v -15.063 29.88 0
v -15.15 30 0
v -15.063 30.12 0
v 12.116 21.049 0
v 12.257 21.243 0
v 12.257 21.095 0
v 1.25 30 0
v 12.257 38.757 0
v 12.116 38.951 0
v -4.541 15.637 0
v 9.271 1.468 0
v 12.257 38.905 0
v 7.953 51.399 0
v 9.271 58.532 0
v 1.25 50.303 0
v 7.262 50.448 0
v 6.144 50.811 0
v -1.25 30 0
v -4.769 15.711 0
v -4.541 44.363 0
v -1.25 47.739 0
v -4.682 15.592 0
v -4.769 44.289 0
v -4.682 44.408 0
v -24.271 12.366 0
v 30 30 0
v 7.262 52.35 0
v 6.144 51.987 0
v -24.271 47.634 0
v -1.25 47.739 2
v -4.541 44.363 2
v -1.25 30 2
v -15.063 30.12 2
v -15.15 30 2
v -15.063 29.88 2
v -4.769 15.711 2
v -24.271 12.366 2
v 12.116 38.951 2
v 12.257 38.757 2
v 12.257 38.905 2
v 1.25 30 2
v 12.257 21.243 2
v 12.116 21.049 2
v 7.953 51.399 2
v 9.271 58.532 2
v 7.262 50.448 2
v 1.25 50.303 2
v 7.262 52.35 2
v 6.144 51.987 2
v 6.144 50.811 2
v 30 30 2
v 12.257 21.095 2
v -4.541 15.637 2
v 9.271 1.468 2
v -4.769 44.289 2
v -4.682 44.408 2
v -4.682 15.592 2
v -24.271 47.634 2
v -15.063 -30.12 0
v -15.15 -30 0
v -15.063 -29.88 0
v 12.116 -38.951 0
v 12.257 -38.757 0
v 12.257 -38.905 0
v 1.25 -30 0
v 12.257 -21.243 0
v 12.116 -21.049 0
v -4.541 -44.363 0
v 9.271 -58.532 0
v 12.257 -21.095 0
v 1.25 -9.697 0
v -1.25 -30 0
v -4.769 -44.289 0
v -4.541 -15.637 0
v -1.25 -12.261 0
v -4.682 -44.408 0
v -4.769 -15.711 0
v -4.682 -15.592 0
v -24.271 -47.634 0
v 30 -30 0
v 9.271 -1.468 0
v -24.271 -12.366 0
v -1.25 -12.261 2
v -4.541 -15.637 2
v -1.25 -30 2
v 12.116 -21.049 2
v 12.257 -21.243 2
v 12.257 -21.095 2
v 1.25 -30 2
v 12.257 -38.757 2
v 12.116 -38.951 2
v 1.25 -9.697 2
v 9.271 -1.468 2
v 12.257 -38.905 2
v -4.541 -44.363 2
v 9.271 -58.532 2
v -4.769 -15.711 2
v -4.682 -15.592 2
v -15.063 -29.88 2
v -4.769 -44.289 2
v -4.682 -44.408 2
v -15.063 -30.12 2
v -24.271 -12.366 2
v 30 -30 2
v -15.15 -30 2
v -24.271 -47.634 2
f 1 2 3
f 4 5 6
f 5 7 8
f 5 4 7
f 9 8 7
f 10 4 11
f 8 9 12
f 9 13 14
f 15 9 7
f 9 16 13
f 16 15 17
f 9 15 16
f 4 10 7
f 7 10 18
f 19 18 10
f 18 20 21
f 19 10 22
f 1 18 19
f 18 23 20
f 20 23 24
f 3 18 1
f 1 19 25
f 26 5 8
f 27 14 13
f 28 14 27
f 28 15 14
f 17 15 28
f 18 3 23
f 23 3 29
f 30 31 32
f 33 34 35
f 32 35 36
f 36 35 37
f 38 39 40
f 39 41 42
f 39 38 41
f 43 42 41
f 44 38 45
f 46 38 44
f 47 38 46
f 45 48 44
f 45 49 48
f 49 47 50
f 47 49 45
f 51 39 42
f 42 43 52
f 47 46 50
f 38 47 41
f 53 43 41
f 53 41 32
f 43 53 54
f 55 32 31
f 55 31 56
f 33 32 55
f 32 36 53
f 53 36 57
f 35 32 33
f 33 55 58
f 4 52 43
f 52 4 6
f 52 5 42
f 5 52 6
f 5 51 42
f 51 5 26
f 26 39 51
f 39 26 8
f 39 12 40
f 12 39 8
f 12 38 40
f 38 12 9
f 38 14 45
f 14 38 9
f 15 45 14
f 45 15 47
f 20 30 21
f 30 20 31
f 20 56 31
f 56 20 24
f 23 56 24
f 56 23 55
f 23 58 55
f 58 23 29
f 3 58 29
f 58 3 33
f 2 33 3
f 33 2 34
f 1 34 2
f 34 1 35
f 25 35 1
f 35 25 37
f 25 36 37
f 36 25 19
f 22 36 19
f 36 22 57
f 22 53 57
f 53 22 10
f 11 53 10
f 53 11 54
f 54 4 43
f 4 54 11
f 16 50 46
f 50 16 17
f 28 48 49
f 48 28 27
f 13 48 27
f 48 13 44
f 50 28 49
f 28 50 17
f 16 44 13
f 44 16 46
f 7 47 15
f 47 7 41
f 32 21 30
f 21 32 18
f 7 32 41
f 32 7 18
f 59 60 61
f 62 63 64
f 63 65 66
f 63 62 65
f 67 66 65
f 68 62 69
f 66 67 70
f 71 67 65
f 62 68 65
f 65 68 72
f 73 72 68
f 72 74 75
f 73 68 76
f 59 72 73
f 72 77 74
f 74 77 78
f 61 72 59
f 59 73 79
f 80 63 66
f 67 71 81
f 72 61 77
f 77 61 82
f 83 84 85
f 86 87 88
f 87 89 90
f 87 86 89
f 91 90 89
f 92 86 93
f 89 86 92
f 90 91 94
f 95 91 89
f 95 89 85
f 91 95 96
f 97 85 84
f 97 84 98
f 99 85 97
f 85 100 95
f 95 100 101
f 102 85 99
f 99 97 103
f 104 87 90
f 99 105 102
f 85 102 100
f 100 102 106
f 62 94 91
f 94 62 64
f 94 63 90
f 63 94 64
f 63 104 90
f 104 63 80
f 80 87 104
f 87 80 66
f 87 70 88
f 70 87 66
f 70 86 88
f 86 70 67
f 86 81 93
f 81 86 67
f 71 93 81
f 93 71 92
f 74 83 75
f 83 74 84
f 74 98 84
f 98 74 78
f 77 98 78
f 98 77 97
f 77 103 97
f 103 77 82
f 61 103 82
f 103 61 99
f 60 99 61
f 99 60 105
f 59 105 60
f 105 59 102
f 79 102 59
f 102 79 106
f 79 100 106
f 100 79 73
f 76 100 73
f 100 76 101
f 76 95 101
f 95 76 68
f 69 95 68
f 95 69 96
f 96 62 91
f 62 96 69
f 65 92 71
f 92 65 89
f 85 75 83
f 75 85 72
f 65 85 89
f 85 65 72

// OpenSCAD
n=6;
h=2;
ro=30;
ri=15;

//-- Parametric star
//-- (c)  2010 Juan Gonzalez-Gomez (Obijuan) juan@iearobotics.com
//-- GPL license

//-- The 2*N points of an N-ponted star are calculated as follows:
//-- There are two circunferences:  the inner and outer.  Outer points are located
//-- at angles: 0, 360/N, 360*2/N and on the outer circunference
//-- The inner points have the same angular distance but they are 360/(2*N) rotated
//-- respect to the outers. They are located on the inner circunference

//--- INPUT PARAMETERS:
//--- N: Number of points
//--  h: Height
//-- ri: Inner radius
//-- ro: outer radius
module parametric_star(N=5, h=3, ri=15, re=30) {

  //-- Calculate and draw a 2D tip of the star
 //-- INPUT: 
 //-- n: Number of the tip (from 0 to N-1)
  module tipstar(n) {
     i1 =  [ri*cos(-360*n/N+360/(N*2)), ri*sin(-360*n/N+360/(N*2))];
    e1 = [re*cos(-360*n/N), re*sin(-360*n/N)];
    i2 = [ri*cos(-360*(n+1)/N+360/(N*2)), ri*sin(-360*(n+1)/N+360/(N*2))];
    polygon([ i1, e1, i2]);
  }

  //-- Draw the 2D star and extrude
  
   //-- The star is the union of N 2D tips. 
   //-- A inner cylinder is also needed for filling
   //-- A flat (2D) star is built. The it is extruded
    linear_extrude(height=h) 
    union() {
      for (i=[0:N-1]) {
         tipstar(i);
      }
      rotate([0,0,360/(2*N)]) circle(r=ri+ri*0.01,$fn=N);
    }
}

//-- Example
n=5;
h=2;
ro=30;
ri=15;
translate([0,ro,0])
difference(){
difference()
{ parametric_star(n, h,ri,ro);
translate([cos(360/n)*0.75*ro,sin(360/n)*0.75*ro,-1]) cylinder (h+2,h/2,h/2);}
translate([-(h+0.5)/2,0,0])cube ([h+0.5,ro+2,h+0.5]);
}
translate([0,-ro,0])
difference(){
difference()
{ parametric_star(n, h,ri,ro);
translate([-(h+0.5)/2,0,0])cube ([h+0.5,ro+2,h+0.5]);
}
}
